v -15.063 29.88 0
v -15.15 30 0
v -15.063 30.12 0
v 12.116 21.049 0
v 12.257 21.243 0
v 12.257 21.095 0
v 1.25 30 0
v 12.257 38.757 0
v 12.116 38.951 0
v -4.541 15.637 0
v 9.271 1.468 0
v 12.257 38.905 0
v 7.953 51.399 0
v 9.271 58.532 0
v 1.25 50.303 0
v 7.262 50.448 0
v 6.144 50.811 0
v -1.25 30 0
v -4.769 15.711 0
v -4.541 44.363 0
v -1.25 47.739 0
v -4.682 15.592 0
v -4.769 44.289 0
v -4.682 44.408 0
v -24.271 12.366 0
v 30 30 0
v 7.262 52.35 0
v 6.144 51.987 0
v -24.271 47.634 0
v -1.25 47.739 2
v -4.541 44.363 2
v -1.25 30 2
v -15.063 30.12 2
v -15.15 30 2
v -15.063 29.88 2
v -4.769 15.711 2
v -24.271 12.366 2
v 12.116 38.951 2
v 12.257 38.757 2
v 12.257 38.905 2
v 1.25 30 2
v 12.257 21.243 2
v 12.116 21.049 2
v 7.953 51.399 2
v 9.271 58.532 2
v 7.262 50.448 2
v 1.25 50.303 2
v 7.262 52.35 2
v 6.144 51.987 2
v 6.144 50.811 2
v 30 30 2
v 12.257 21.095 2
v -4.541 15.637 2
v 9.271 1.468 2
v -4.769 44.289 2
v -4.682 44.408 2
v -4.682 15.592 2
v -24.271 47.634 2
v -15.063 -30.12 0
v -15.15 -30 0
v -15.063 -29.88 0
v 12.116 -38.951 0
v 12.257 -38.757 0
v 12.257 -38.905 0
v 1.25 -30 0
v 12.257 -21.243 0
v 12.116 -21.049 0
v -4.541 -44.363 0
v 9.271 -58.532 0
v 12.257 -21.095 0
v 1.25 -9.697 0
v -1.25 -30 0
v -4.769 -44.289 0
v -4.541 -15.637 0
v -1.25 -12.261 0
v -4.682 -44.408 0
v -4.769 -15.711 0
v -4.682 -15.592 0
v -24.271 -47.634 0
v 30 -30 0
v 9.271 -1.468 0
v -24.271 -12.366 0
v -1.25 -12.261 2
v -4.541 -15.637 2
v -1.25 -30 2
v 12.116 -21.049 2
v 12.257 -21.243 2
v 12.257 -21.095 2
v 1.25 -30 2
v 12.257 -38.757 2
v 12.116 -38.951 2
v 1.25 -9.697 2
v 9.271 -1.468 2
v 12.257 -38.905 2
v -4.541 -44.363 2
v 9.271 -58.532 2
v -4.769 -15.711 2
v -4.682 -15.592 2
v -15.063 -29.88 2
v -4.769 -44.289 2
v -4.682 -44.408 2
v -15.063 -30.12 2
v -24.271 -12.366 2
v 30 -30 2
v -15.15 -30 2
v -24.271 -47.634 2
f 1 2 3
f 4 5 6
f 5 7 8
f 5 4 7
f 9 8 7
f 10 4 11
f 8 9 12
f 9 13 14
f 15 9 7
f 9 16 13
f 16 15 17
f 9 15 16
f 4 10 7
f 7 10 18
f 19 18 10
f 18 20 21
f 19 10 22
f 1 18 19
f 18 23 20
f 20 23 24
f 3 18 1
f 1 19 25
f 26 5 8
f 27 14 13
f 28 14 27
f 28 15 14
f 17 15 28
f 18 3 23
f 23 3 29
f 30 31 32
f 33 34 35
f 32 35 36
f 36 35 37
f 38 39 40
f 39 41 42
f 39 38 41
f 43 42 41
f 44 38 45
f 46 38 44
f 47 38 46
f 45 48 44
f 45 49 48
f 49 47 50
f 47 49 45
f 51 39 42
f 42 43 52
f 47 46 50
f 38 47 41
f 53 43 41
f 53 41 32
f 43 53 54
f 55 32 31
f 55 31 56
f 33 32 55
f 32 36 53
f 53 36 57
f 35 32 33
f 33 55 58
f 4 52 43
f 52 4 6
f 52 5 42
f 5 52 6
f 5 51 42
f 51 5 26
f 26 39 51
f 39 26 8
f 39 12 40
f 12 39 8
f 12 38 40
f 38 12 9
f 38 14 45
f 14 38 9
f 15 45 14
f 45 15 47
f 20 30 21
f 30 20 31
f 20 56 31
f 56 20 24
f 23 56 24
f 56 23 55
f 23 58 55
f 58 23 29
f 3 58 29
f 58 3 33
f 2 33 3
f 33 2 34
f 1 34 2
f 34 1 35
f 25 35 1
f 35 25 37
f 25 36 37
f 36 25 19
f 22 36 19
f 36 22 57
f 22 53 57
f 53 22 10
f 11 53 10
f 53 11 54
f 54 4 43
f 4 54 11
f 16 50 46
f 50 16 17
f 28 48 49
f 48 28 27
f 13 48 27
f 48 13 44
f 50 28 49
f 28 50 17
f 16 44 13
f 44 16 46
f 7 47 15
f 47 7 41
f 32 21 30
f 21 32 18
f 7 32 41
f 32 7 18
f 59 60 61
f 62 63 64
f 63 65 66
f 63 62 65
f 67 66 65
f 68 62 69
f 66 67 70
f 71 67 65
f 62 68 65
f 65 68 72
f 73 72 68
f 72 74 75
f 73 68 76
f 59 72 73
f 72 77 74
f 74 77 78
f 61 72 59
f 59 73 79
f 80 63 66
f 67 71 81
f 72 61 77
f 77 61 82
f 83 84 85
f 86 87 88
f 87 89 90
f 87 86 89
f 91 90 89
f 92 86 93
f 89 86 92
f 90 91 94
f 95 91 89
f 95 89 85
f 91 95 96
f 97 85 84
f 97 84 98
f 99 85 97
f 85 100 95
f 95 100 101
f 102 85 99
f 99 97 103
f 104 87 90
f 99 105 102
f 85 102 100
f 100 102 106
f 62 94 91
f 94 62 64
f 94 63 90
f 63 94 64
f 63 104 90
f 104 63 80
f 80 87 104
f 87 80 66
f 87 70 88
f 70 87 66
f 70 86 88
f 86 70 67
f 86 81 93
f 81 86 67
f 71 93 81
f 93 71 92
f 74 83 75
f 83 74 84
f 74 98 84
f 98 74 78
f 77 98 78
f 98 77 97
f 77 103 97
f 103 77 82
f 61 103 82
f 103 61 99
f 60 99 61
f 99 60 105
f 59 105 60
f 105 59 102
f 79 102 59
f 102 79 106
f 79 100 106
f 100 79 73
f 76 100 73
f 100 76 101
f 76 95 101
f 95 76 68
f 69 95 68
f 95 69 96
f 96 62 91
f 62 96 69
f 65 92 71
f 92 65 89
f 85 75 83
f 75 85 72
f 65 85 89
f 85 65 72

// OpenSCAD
n=6;
h=2;
ro=30;
ri=15;

//-- Parametric star
//-- (c)  2010 Juan Gonzalez-Gomez (Obijuan) juan@iearobotics.com
//-- GPL license

//-- The 2*N points of an N-ponted star are calculated as follows:
//-- There are two circunferences:  the inner and outer.  Outer points are located
//-- at angles: 0, 360/N, 360*2/N and on the outer circunference
//-- The inner points have the same angular distance but they are 360/(2*N) rotated
//-- respect to the outers. They are located on the inner circunference

//--- INPUT PARAMETERS:
//--- N: Number of points
//--  h: Height
//-- ri: Inner radius
//-- ro: outer radius
module parametric_star(N=5, h=3, ri=15, re=30) {

  //-- Calculate and draw a 2D tip of the star
 //-- INPUT: 
 //-- n: Number of the tip (from 0 to N-1)
  module tipstar(n) {
     i1 =  [ri*cos(-360*n/N+360/(N*2)), ri*sin(-360*n/N+360/(N*2))];
    e1 = [re*cos(-360*n/N), re*sin(-360*n/N)];
    i2 = [ri*cos(-360*(n+1)/N+360/(N*2)), ri*sin(-360*(n+1)/N+360/(N*2))];
    polygon([ i1, e1, i2]);
  }

  //-- Draw the 2D star and extrude
  
   //-- The star is the union of N 2D tips. 
   //-- A inner cylinder is also needed for filling
   //-- A flat (2D) star is built. The it is extruded
    linear_extrude(height=h) 
    union() {
      for (i=[0:N-1]) {
         tipstar(i);
      }
      rotate([0,0,360/(2*N)]) circle(r=ri+ri*0.01,$fn=N);
    }
}

//-- Example
n=5;
h=2;
ro=30;
ri=15;
translate([0,ro,0])
difference(){
difference()
{ parametric_star(n, h,ri,ro);
translate([cos(360/n)*0.75*ro,sin(360/n)*0.75*ro,-1]) cylinder (h+2,h/2,h/2);}
translate([-(h+0.5)/2,0,0])cube ([h+0.5,ro+2,h+0.5]);
}
translate([0,-ro,0])
difference(){
difference()
{ parametric_star(n, h,ri,ro);
translate([-(h+0.5)/2,0,0])cube ([h+0.5,ro+2,h+0.5]);
}
}
